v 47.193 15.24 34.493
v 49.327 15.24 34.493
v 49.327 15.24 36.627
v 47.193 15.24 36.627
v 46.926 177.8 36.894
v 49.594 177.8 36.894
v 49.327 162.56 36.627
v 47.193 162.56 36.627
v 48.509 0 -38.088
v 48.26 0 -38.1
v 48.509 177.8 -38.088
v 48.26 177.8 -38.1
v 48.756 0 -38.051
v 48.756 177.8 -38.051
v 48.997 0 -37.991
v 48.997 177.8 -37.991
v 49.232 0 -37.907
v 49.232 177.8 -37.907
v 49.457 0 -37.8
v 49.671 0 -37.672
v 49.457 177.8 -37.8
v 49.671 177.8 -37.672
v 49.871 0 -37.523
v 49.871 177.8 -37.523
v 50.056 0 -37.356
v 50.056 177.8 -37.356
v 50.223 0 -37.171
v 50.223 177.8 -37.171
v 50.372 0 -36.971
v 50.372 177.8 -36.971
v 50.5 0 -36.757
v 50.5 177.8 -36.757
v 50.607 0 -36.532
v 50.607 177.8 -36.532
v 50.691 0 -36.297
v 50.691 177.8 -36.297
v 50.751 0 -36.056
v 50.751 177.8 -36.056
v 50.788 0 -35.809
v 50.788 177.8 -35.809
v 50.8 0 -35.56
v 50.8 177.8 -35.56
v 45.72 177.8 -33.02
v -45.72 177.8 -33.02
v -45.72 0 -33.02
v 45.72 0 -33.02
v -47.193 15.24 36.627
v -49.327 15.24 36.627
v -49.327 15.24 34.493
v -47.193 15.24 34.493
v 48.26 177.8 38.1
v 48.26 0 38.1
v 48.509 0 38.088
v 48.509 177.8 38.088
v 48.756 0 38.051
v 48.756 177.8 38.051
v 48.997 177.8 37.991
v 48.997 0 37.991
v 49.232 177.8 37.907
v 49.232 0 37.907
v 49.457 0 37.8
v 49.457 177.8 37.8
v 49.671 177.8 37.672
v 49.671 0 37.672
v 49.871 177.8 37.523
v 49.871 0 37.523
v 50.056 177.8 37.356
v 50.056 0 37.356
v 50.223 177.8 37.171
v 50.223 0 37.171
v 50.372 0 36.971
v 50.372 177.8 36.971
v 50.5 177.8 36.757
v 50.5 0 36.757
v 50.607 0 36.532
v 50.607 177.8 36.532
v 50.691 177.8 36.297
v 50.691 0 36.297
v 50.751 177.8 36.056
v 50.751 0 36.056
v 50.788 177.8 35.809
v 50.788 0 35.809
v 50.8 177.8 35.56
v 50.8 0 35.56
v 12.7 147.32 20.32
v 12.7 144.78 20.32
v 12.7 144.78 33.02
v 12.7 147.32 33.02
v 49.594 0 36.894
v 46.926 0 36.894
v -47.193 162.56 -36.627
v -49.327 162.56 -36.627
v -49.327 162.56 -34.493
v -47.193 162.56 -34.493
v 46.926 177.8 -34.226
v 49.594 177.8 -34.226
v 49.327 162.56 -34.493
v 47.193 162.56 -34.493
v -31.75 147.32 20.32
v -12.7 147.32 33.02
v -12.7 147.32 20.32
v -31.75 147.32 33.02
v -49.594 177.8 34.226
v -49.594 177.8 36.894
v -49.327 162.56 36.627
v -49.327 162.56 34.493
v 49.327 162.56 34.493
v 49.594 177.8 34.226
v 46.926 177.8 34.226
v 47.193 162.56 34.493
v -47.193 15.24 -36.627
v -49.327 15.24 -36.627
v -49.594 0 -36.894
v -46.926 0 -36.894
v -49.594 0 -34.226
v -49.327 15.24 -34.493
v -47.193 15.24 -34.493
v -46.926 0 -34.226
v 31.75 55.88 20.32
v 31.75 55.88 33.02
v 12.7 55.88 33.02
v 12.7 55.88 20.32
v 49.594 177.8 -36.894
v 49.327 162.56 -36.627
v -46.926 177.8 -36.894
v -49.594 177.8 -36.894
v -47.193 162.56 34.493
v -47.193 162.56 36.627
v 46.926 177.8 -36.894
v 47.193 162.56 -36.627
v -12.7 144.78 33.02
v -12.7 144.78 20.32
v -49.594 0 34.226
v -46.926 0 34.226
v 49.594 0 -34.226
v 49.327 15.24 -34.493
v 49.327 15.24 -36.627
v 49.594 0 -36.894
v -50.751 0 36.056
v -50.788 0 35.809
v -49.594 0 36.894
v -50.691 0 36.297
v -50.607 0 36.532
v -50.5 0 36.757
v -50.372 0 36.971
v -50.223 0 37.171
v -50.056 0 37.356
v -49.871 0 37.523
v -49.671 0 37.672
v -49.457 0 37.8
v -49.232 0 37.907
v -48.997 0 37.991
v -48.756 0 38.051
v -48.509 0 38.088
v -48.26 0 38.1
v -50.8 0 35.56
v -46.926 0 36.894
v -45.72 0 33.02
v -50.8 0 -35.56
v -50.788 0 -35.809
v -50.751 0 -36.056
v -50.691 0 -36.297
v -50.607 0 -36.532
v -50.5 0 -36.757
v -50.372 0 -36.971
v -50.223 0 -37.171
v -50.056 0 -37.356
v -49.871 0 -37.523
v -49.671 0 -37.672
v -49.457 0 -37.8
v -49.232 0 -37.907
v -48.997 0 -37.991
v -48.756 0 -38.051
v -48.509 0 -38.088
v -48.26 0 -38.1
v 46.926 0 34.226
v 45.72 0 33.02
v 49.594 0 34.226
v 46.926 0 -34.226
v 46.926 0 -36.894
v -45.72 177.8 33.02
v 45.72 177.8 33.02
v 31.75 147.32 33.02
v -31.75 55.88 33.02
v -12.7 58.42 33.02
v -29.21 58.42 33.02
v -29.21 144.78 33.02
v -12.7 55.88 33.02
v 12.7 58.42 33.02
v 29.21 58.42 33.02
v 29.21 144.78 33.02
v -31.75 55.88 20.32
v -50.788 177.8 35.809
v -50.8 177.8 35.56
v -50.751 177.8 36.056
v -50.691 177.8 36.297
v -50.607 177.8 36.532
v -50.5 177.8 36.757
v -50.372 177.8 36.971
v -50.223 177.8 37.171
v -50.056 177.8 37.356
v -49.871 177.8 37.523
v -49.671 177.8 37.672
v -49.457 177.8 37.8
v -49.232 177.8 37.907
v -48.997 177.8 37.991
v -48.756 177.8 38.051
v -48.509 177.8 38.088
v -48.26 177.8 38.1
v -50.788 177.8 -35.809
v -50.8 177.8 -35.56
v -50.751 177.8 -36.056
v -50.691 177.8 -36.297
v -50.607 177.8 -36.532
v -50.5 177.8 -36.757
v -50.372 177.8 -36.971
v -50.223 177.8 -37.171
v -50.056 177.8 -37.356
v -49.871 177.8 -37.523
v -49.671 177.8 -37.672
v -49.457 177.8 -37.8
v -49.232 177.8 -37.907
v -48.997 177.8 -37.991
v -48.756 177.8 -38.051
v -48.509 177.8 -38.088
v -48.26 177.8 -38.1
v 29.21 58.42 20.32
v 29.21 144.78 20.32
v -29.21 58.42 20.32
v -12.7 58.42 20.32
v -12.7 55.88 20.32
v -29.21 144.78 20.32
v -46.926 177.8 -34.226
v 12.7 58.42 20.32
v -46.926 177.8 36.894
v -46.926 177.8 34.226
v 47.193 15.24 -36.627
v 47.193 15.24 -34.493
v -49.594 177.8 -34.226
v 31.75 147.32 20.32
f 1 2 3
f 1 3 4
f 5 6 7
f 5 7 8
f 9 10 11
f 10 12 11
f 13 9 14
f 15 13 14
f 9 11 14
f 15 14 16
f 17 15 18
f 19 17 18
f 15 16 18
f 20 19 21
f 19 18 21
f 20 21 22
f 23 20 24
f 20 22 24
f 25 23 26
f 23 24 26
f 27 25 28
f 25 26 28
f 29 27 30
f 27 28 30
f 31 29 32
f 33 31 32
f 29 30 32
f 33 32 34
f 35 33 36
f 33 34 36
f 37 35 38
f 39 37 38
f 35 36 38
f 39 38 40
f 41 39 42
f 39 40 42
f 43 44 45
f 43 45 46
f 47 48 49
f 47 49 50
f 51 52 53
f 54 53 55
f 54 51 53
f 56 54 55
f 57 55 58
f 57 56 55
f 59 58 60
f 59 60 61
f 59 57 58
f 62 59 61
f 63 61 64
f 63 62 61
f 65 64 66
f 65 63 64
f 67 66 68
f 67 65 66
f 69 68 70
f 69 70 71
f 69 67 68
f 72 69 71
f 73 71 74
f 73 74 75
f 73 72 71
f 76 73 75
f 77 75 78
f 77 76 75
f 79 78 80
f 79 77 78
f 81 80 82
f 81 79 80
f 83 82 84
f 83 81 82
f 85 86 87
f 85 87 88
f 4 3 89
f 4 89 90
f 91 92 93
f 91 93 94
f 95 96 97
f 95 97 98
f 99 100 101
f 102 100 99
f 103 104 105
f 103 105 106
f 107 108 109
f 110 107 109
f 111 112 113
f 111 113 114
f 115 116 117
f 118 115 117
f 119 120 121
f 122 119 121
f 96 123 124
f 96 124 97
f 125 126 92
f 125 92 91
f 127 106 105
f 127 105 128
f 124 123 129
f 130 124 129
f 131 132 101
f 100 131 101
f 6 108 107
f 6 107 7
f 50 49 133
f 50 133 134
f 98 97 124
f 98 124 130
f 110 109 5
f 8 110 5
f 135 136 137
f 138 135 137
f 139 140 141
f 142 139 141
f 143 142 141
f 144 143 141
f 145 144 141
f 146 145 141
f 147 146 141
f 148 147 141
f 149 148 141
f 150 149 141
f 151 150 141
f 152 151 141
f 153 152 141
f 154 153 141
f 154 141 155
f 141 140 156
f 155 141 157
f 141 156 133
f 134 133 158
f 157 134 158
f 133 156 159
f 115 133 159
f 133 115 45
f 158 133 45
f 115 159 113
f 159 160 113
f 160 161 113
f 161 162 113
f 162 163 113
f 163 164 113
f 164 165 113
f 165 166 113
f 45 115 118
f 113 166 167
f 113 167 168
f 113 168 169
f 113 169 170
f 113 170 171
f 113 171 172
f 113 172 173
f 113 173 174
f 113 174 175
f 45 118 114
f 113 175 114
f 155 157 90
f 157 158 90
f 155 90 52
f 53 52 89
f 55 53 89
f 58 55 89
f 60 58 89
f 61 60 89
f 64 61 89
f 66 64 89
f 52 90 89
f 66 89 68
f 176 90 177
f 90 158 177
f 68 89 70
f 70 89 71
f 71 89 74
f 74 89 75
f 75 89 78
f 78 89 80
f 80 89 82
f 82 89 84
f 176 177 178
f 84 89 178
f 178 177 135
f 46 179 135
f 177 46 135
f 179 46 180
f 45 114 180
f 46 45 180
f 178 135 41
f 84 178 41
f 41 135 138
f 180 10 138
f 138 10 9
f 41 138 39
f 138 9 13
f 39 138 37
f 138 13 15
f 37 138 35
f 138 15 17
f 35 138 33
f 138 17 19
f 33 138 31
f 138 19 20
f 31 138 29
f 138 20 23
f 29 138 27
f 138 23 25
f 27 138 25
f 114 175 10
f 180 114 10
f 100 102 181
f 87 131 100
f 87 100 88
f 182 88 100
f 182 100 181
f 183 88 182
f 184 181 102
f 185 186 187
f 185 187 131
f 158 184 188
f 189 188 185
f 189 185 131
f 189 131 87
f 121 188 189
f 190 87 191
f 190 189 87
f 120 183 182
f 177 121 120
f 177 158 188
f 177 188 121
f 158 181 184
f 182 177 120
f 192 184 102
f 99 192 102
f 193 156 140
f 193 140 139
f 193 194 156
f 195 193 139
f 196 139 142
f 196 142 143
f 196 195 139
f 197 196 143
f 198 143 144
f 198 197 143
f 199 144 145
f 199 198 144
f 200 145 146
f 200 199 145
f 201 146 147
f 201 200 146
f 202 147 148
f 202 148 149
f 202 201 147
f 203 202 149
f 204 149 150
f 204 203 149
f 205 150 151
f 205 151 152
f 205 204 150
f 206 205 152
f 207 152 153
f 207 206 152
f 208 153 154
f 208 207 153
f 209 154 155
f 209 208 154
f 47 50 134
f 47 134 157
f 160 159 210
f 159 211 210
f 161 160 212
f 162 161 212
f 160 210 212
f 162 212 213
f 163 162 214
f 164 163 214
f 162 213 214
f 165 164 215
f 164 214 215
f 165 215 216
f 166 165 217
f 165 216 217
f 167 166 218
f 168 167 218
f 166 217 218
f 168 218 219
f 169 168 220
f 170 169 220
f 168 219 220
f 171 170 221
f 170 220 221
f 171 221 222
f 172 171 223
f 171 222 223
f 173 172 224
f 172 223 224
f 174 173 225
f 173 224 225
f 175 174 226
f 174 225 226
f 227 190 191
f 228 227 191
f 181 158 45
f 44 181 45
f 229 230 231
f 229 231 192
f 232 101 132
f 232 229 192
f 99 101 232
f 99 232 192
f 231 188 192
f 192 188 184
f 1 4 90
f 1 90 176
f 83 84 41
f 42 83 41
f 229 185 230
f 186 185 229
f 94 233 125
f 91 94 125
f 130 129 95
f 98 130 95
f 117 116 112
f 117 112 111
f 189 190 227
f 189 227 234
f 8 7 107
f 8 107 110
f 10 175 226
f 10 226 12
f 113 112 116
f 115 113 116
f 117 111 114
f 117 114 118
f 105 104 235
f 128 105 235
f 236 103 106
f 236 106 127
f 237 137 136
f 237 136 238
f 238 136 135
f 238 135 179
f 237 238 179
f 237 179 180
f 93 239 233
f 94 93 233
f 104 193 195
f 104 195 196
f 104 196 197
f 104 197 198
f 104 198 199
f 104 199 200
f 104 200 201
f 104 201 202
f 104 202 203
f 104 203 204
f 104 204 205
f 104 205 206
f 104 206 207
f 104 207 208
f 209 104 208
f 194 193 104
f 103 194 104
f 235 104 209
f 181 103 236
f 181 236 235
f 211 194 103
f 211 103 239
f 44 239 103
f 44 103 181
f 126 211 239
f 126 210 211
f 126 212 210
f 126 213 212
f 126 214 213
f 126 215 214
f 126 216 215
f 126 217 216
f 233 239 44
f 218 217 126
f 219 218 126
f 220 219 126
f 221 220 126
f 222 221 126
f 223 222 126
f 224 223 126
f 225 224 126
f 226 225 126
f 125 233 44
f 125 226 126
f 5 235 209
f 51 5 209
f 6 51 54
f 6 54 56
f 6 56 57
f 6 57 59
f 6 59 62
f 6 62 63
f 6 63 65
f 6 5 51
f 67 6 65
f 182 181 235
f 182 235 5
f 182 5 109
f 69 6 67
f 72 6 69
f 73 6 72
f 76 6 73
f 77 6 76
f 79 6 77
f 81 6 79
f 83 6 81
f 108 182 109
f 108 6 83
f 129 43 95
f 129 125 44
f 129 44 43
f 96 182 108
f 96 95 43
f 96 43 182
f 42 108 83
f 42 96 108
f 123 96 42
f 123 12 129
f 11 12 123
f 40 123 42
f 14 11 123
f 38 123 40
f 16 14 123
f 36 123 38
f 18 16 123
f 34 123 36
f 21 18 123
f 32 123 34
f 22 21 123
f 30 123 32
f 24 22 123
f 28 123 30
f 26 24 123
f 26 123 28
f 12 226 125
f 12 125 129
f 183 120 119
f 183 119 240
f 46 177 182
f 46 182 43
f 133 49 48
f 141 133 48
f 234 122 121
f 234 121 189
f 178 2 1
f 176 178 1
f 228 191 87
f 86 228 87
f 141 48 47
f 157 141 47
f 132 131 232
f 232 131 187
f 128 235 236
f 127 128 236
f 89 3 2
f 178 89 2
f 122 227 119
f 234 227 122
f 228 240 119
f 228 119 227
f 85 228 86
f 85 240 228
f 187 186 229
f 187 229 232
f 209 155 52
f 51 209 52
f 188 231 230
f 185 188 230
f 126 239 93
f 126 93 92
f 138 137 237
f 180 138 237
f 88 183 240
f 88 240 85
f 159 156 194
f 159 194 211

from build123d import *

# Parameters (mm, degrees)
SKETCH1_W               = 101.6
SKETCH1_H               = 76.2
BOSS_EXTRUDE1_DEPTH     = 177.8
SHELL1_T                = -5.08
SKETCH2_W               = 2.667
SKETCH2_H               = 2.667
CUT_EXTRUDE1_DEPTH      = 15.24
CUT_EXTRUDE1_DRAFT      = -1
MIRROR1_COPY_1_SKETCH_W = 2.667
MIRROR1_COPY_1_SKETCH_H = 2.667
MIRROR1_COPY_1_DEPTH    = 15.24
MIRROR1_COPY_1_DRAFT    = -1
MIRROR2_COPY_1_SKETCH_W = 2.667
MIRROR2_COPY_1_SKETCH_H = 2.667
MIRROR2_COPY_1_DEPTH    = 15.24
MIRROR2_COPY_1_DRAFT    = -1
MIRROR2_COPY_2_SKETCH_W = 2.667
MIRROR2_COPY_2_SKETCH_H = 2.667
MIRROR2_COPY_2_DEPTH    = 15.24
MIRROR2_COPY_2_DRAFT    = -1
MIRROR3_COPY_1_SKETCH_W = 2.667
MIRROR3_COPY_1_SKETCH_H = 2.667
MIRROR3_COPY_1_DEPTH    = 15.24
MIRROR3_COPY_1_DRAFT    = -1
MIRROR3_COPY_2_SKETCH_W = 2.667
MIRROR3_COPY_2_SKETCH_H = 2.667
MIRROR3_COPY_2_DEPTH    = 15.24
MIRROR3_COPY_2_DRAFT    = -1
MIRROR3_COPY_3_SKETCH_W = 2.667
MIRROR3_COPY_3_SKETCH_H = 2.667
MIRROR3_COPY_3_DEPTH    = 15.24
MIRROR3_COPY_3_DRAFT    = -1
MIRROR3_COPY_4_SKETCH_W = 2.667
MIRROR3_COPY_4_SKETCH_H = 2.667
MIRROR3_COPY_4_DEPTH    = 15.24
MIRROR3_COPY_4_DRAFT    = -1
SKETCH3_W               = 63.5
SKETCH3_H               = 91.44
SKETCH3_W_2             = 58.42
SKETCH3_H_2             = 86.36
EXTRUDE_THIN1_DEPTH     = 12.7
SKETCH4_W               = 25.4
SKETCH4_H               = 91.44
CUT_EXTRUDE_THIN1_DEPTH = 12.7
FILLET1_R               = 2.54


with BuildPart() as part:
    # Sketch1 → Boss-Extrude1 (new body)
    with BuildSketch(Plane(origin=(0, 0, 0), x_dir=(1, 0, 0), z_dir=(0, 1, 0))):
        Rectangle(SKETCH1_W, SKETCH1_H)
    extrude(amount=BOSS_EXTRUDE1_DEPTH)

    # Shell1
    shell1_openings = [part.faces().sort_by_distance(p)[0] for p in [
        (0, 177.8, 0),
        (0, 0, 0),
    ]]
    offset(amount=SHELL1_T, openings=shell1_openings, kind=Kind.INTERSECTION)


with BuildPart() as cut_extrude1_tool:
    # Sketch2 → Cut-Extrude1 (with draft: the straight prism first)
    with BuildSketch(Plane(origin=(0, 177.8, 0), x_dir=(1, 0, 0), z_dir=(0, 1, 0))):
        with Locations((-48.26, 35.56)):
            Rectangle(SKETCH2_W, SKETCH2_H)
    extrude(amount=-CUT_EXTRUDE1_DEPTH)
    # Cut-Extrude1: the draft: its side faces are tilted about the plane it starts from
    cut_extrude1_sides = [cut_extrude1_tool.faces().sort_by_distance(p)[0] for p in [
        (-49.5935, 170.18, -35.56),
        (-48.26, 170.18, -34.2265),
        (-46.9265, 170.18, -35.56),
        (-48.26, 170.18, -36.8935),
    ]]
    draft(cut_extrude1_sides, Plane(origin=(0, 177.8, 0), x_dir=(1, 0, 0), z_dir=(0, 1, 0)), CUT_EXTRUDE1_DRAFT)


with BuildPart() as part_1:
    add(part.part)

    # Cut-Extrude1: cut by cut_extrude1_tool
    add(cut_extrude1_tool.part, mode=Mode.SUBTRACT)


with BuildPart() as mirror1_copy_1_tool:
    # Mirror1 copy 1 sketch → Mirror1 copy 1 (with draft: the straight prism first)
    with BuildSketch(Plane(origin=(0, 177.8, 0), x_dir=(1, 0, 0), z_dir=(0, 1, 0))):
        with Locations((-48.26, -35.56)):
            Rectangle(MIRROR1_COPY_1_SKETCH_W, MIRROR1_COPY_1_SKETCH_H)
    extrude(amount=-MIRROR1_COPY_1_DEPTH)
    # Mirror1 copy 1: the draft: its side faces are tilted about the plane it starts from
    mirror1_copy_1_sides = [mirror1_copy_1_tool.faces().sort_by_distance(p)[0] for p in [
        (-49.5935, 170.18, 35.56),
        (-48.26, 170.18, 34.2265),
        (-46.9265, 170.18, 35.56),
        (-48.26, 170.18, 36.8935),
    ]]
    draft(mirror1_copy_1_sides, Plane(origin=(0, 177.8, 0), x_dir=(1, 0, 0), z_dir=(0, 1, 0)), MIRROR1_COPY_1_DRAFT)


with BuildPart() as part_2:
    add(part_1.part)

    # Mirror1 copy 1: cut by mirror1_copy_1_tool
    add(mirror1_copy_1_tool.part, mode=Mode.SUBTRACT)


with BuildPart() as mirror2_copy_1_tool:
    # Mirror2 copy 1 sketch → Mirror2 copy 1 (with draft: the straight prism first)
    with BuildSketch(Plane(origin=(0, 177.8, 0), x_dir=(-1, 0, 0), z_dir=(0, 1, 0))):
        with Locations((-48.26, -35.56)):
            Rectangle(MIRROR2_COPY_1_SKETCH_W, MIRROR2_COPY_1_SKETCH_H)
    extrude(amount=-MIRROR2_COPY_1_DEPTH)
    # Mirror2 copy 1: the draft: its side faces are tilted about the plane it starts from
    mirror2_copy_1_sides = [mirror2_copy_1_tool.faces().sort_by_distance(p)[0] for p in [
        (49.5935, 170.18, -35.56),
        (48.26, 170.18, -34.2265),
        (46.9265, 170.18, -35.56),
        (48.26, 170.18, -36.8935),
    ]]
    draft(mirror2_copy_1_sides, Plane(origin=(0, 177.8, 0), x_dir=(-1, 0, 0), z_dir=(0, 1, 0)), MIRROR2_COPY_1_DRAFT)


with BuildPart() as part_3:
    add(part_2.part)

    # Mirror2 copy 1: cut by mirror2_copy_1_tool
    add(mirror2_copy_1_tool.part, mode=Mode.SUBTRACT)


with BuildPart() as mirror2_copy_2_tool:
    # Mirror2 copy 2 sketch → Mirror2 copy 2 (with draft: the straight prism first)
    with BuildSketch(Plane(origin=(0, 177.8, 0), x_dir=(-1, 0, 0), z_dir=(0, 1, 0))):
        with Locations((-48.26, 35.56)):
            Rectangle(MIRROR2_COPY_2_SKETCH_W, MIRROR2_COPY_2_SKETCH_H)
    extrude(amount=-MIRROR2_COPY_2_DEPTH)
    # Mirror2 copy 2: the draft: its side faces are tilted about the plane it starts from
    mirror2_copy_2_sides = [mirror2_copy_2_tool.faces().sort_by_distance(p)[0] for p in [
        (49.5935, 170.18, 35.56),
        (48.26, 170.18, 34.2265),
        (46.9265, 170.18, 35.56),
        (48.26, 170.18, 36.8935),
    ]]
    draft(mirror2_copy_2_sides, Plane(origin=(0, 177.8, 0), x_dir=(-1, 0, 0), z_dir=(0, 1, 0)), MIRROR2_COPY_2_DRAFT)


with BuildPart() as part_4:
    add(part_3.part)

    # Mirror2 copy 2: cut by mirror2_copy_2_tool
    add(mirror2_copy_2_tool.part, mode=Mode.SUBTRACT)


with BuildPart() as mirror3_copy_1_tool:
    # Mirror3 copy 1 sketch → Mirror3 copy 1 (with draft: the straight prism first)
    with BuildSketch(Plane.XZ):
        with Locations((-48.26, -35.56)):
            Rectangle(MIRROR3_COPY_1_SKETCH_W, MIRROR3_COPY_1_SKETCH_H)
    extrude(amount=-MIRROR3_COPY_1_DEPTH)
    # Mirror3 copy 1: the draft: its side faces are tilted about the plane it starts from
    mirror3_copy_1_sides = [mirror3_copy_1_tool.faces().sort_by_distance(p)[0] for p in [
        (-49.5935, 7.62, -35.56),
        (-48.26, 7.62, -34.2265),
        (-46.9265, 7.62, -35.56),
        (-48.26, 7.62, -36.8935),
    ]]
    draft(mirror3_copy_1_sides, Plane.XZ, MIRROR3_COPY_1_DRAFT)


with BuildPart() as part_5:
    add(part_4.part)

    # Mirror3 copy 1: cut by mirror3_copy_1_tool
    add(mirror3_copy_1_tool.part, mode=Mode.SUBTRACT)


with BuildPart() as mirror3_copy_2_tool:
    # Mirror3 copy 2 sketch → Mirror3 copy 2 (with draft: the straight prism first)
    with BuildSketch(Plane.XZ):
        with Locations((-48.26, 35.56)):
            Rectangle(MIRROR3_COPY_2_SKETCH_W, MIRROR3_COPY_2_SKETCH_H)
    extrude(amount=-MIRROR3_COPY_2_DEPTH)
    # Mirror3 copy 2: the draft: its side faces are tilted about the plane it starts from
    mirror3_copy_2_sides = [mirror3_copy_2_tool.faces().sort_by_distance(p)[0] for p in [
        (-49.5935, 7.62, 35.56),
        (-48.26, 7.62, 34.2265),
        (-46.9265, 7.62, 35.56),
        (-48.26, 7.62, 36.8935),
    ]]
    draft(mirror3_copy_2_sides, Plane.XZ, MIRROR3_COPY_2_DRAFT)


with BuildPart() as part_6:
    add(part_5.part)

    # Mirror3 copy 2: cut by mirror3_copy_2_tool
    add(mirror3_copy_2_tool.part, mode=Mode.SUBTRACT)


with BuildPart() as mirror3_copy_3_tool:
    # Mirror3 copy 3 sketch → Mirror3 copy 3 (with draft: the straight prism first)
    with BuildSketch(Plane(origin=(0, 0, 0), x_dir=(-1, 0, 0), z_dir=(0, -1, 0))):
        with Locations((-48.26, 35.56)):
            Rectangle(MIRROR3_COPY_3_SKETCH_W, MIRROR3_COPY_3_SKETCH_H)
    extrude(amount=-MIRROR3_COPY_3_DEPTH)
    # Mirror3 copy 3: the draft: its side faces are tilted about the plane it starts from
    mirror3_copy_3_sides = [mirror3_copy_3_tool.faces().sort_by_distance(p)[0] for p in [
        (49.5935, 7.62, -35.56),
        (48.26, 7.62, -34.2265),
        (46.9265, 7.62, -35.56),
        (48.26, 7.62, -36.8935),
    ]]
    draft(mirror3_copy_3_sides, Plane(origin=(0, 0, 0), x_dir=(-1, 0, 0), z_dir=(0, -1, 0)), MIRROR3_COPY_3_DRAFT)


with BuildPart() as part_7:
    add(part_6.part)

    # Mirror3 copy 3: cut by mirror3_copy_3_tool
    add(mirror3_copy_3_tool.part, mode=Mode.SUBTRACT)


with BuildPart() as mirror3_copy_4_tool:
    # Mirror3 copy 4 sketch → Mirror3 copy 4 (with draft: the straight prism first)
    with BuildSketch(Plane(origin=(0, 0, 0), x_dir=(-1, 0, 0), z_dir=(0, -1, 0))):
        with Locations((-48.26, -35.56)):
            Rectangle(MIRROR3_COPY_4_SKETCH_W, MIRROR3_COPY_4_SKETCH_H)
    extrude(amount=-MIRROR3_COPY_4_DEPTH)
    # Mirror3 copy 4: the draft: its side faces are tilted about the plane it starts from
    mirror3_copy_4_sides = [mirror3_copy_4_tool.faces().sort_by_distance(p)[0] for p in [
        (49.5935, 7.62, 35.56),
        (48.26, 7.62, 34.2265),
        (46.9265, 7.62, 35.56),
        (48.26, 7.62, 36.8935),
    ]]
    draft(mirror3_copy_4_sides, Plane(origin=(0, 0, 0), x_dir=(-1, 0, 0), z_dir=(0, -1, 0)), MIRROR3_COPY_4_DRAFT)


with BuildPart() as part_8:
    add(part_7.part)

    # Mirror3 copy 4: cut by mirror3_copy_4_tool
    add(mirror3_copy_4_tool.part, mode=Mode.SUBTRACT)

    # Sketch3 → Extrude-Thin1 (add)
    with BuildSketch(Plane(origin=(0, 0, 33.02), x_dir=(-1, 0, 0), z_dir=(0, 0, -1))):
        with Locations((0, 101.6)):
            Rectangle(SKETCH3_W, SKETCH3_H)
        with Locations((0, 101.6)):
            Rectangle(SKETCH3_W_2, SKETCH3_H_2, mode=Mode.SUBTRACT)
    extrude(amount=EXTRUDE_THIN1_DEPTH)

    # Sketch4 → Cut-Extrude-Thin1 (cut)
    with BuildSketch(Plane(origin=(0, 0, 20.32), x_dir=(-1, 0, 0), z_dir=(0, 0, -1))):
        with Locations((0, 101.6)):
            Rectangle(SKETCH4_W, SKETCH4_H)
    extrude(amount=-CUT_EXTRUDE_THIN1_DEPTH, mode=Mode.SUBTRACT)

    # Fillet1
    fillet1_edges = [part_8.edges().sort_by_distance(p)[0] for p in [
        (50.8, 88.9, 38.1),
        (-50.8, 88.9, 38.1),
        (-50.8, 88.9, -38.1),
        (50.8, 88.9, -38.1),
    ]]
    fillet(fillet1_edges, radius=FILLET1_R)


solid = part_8.part
